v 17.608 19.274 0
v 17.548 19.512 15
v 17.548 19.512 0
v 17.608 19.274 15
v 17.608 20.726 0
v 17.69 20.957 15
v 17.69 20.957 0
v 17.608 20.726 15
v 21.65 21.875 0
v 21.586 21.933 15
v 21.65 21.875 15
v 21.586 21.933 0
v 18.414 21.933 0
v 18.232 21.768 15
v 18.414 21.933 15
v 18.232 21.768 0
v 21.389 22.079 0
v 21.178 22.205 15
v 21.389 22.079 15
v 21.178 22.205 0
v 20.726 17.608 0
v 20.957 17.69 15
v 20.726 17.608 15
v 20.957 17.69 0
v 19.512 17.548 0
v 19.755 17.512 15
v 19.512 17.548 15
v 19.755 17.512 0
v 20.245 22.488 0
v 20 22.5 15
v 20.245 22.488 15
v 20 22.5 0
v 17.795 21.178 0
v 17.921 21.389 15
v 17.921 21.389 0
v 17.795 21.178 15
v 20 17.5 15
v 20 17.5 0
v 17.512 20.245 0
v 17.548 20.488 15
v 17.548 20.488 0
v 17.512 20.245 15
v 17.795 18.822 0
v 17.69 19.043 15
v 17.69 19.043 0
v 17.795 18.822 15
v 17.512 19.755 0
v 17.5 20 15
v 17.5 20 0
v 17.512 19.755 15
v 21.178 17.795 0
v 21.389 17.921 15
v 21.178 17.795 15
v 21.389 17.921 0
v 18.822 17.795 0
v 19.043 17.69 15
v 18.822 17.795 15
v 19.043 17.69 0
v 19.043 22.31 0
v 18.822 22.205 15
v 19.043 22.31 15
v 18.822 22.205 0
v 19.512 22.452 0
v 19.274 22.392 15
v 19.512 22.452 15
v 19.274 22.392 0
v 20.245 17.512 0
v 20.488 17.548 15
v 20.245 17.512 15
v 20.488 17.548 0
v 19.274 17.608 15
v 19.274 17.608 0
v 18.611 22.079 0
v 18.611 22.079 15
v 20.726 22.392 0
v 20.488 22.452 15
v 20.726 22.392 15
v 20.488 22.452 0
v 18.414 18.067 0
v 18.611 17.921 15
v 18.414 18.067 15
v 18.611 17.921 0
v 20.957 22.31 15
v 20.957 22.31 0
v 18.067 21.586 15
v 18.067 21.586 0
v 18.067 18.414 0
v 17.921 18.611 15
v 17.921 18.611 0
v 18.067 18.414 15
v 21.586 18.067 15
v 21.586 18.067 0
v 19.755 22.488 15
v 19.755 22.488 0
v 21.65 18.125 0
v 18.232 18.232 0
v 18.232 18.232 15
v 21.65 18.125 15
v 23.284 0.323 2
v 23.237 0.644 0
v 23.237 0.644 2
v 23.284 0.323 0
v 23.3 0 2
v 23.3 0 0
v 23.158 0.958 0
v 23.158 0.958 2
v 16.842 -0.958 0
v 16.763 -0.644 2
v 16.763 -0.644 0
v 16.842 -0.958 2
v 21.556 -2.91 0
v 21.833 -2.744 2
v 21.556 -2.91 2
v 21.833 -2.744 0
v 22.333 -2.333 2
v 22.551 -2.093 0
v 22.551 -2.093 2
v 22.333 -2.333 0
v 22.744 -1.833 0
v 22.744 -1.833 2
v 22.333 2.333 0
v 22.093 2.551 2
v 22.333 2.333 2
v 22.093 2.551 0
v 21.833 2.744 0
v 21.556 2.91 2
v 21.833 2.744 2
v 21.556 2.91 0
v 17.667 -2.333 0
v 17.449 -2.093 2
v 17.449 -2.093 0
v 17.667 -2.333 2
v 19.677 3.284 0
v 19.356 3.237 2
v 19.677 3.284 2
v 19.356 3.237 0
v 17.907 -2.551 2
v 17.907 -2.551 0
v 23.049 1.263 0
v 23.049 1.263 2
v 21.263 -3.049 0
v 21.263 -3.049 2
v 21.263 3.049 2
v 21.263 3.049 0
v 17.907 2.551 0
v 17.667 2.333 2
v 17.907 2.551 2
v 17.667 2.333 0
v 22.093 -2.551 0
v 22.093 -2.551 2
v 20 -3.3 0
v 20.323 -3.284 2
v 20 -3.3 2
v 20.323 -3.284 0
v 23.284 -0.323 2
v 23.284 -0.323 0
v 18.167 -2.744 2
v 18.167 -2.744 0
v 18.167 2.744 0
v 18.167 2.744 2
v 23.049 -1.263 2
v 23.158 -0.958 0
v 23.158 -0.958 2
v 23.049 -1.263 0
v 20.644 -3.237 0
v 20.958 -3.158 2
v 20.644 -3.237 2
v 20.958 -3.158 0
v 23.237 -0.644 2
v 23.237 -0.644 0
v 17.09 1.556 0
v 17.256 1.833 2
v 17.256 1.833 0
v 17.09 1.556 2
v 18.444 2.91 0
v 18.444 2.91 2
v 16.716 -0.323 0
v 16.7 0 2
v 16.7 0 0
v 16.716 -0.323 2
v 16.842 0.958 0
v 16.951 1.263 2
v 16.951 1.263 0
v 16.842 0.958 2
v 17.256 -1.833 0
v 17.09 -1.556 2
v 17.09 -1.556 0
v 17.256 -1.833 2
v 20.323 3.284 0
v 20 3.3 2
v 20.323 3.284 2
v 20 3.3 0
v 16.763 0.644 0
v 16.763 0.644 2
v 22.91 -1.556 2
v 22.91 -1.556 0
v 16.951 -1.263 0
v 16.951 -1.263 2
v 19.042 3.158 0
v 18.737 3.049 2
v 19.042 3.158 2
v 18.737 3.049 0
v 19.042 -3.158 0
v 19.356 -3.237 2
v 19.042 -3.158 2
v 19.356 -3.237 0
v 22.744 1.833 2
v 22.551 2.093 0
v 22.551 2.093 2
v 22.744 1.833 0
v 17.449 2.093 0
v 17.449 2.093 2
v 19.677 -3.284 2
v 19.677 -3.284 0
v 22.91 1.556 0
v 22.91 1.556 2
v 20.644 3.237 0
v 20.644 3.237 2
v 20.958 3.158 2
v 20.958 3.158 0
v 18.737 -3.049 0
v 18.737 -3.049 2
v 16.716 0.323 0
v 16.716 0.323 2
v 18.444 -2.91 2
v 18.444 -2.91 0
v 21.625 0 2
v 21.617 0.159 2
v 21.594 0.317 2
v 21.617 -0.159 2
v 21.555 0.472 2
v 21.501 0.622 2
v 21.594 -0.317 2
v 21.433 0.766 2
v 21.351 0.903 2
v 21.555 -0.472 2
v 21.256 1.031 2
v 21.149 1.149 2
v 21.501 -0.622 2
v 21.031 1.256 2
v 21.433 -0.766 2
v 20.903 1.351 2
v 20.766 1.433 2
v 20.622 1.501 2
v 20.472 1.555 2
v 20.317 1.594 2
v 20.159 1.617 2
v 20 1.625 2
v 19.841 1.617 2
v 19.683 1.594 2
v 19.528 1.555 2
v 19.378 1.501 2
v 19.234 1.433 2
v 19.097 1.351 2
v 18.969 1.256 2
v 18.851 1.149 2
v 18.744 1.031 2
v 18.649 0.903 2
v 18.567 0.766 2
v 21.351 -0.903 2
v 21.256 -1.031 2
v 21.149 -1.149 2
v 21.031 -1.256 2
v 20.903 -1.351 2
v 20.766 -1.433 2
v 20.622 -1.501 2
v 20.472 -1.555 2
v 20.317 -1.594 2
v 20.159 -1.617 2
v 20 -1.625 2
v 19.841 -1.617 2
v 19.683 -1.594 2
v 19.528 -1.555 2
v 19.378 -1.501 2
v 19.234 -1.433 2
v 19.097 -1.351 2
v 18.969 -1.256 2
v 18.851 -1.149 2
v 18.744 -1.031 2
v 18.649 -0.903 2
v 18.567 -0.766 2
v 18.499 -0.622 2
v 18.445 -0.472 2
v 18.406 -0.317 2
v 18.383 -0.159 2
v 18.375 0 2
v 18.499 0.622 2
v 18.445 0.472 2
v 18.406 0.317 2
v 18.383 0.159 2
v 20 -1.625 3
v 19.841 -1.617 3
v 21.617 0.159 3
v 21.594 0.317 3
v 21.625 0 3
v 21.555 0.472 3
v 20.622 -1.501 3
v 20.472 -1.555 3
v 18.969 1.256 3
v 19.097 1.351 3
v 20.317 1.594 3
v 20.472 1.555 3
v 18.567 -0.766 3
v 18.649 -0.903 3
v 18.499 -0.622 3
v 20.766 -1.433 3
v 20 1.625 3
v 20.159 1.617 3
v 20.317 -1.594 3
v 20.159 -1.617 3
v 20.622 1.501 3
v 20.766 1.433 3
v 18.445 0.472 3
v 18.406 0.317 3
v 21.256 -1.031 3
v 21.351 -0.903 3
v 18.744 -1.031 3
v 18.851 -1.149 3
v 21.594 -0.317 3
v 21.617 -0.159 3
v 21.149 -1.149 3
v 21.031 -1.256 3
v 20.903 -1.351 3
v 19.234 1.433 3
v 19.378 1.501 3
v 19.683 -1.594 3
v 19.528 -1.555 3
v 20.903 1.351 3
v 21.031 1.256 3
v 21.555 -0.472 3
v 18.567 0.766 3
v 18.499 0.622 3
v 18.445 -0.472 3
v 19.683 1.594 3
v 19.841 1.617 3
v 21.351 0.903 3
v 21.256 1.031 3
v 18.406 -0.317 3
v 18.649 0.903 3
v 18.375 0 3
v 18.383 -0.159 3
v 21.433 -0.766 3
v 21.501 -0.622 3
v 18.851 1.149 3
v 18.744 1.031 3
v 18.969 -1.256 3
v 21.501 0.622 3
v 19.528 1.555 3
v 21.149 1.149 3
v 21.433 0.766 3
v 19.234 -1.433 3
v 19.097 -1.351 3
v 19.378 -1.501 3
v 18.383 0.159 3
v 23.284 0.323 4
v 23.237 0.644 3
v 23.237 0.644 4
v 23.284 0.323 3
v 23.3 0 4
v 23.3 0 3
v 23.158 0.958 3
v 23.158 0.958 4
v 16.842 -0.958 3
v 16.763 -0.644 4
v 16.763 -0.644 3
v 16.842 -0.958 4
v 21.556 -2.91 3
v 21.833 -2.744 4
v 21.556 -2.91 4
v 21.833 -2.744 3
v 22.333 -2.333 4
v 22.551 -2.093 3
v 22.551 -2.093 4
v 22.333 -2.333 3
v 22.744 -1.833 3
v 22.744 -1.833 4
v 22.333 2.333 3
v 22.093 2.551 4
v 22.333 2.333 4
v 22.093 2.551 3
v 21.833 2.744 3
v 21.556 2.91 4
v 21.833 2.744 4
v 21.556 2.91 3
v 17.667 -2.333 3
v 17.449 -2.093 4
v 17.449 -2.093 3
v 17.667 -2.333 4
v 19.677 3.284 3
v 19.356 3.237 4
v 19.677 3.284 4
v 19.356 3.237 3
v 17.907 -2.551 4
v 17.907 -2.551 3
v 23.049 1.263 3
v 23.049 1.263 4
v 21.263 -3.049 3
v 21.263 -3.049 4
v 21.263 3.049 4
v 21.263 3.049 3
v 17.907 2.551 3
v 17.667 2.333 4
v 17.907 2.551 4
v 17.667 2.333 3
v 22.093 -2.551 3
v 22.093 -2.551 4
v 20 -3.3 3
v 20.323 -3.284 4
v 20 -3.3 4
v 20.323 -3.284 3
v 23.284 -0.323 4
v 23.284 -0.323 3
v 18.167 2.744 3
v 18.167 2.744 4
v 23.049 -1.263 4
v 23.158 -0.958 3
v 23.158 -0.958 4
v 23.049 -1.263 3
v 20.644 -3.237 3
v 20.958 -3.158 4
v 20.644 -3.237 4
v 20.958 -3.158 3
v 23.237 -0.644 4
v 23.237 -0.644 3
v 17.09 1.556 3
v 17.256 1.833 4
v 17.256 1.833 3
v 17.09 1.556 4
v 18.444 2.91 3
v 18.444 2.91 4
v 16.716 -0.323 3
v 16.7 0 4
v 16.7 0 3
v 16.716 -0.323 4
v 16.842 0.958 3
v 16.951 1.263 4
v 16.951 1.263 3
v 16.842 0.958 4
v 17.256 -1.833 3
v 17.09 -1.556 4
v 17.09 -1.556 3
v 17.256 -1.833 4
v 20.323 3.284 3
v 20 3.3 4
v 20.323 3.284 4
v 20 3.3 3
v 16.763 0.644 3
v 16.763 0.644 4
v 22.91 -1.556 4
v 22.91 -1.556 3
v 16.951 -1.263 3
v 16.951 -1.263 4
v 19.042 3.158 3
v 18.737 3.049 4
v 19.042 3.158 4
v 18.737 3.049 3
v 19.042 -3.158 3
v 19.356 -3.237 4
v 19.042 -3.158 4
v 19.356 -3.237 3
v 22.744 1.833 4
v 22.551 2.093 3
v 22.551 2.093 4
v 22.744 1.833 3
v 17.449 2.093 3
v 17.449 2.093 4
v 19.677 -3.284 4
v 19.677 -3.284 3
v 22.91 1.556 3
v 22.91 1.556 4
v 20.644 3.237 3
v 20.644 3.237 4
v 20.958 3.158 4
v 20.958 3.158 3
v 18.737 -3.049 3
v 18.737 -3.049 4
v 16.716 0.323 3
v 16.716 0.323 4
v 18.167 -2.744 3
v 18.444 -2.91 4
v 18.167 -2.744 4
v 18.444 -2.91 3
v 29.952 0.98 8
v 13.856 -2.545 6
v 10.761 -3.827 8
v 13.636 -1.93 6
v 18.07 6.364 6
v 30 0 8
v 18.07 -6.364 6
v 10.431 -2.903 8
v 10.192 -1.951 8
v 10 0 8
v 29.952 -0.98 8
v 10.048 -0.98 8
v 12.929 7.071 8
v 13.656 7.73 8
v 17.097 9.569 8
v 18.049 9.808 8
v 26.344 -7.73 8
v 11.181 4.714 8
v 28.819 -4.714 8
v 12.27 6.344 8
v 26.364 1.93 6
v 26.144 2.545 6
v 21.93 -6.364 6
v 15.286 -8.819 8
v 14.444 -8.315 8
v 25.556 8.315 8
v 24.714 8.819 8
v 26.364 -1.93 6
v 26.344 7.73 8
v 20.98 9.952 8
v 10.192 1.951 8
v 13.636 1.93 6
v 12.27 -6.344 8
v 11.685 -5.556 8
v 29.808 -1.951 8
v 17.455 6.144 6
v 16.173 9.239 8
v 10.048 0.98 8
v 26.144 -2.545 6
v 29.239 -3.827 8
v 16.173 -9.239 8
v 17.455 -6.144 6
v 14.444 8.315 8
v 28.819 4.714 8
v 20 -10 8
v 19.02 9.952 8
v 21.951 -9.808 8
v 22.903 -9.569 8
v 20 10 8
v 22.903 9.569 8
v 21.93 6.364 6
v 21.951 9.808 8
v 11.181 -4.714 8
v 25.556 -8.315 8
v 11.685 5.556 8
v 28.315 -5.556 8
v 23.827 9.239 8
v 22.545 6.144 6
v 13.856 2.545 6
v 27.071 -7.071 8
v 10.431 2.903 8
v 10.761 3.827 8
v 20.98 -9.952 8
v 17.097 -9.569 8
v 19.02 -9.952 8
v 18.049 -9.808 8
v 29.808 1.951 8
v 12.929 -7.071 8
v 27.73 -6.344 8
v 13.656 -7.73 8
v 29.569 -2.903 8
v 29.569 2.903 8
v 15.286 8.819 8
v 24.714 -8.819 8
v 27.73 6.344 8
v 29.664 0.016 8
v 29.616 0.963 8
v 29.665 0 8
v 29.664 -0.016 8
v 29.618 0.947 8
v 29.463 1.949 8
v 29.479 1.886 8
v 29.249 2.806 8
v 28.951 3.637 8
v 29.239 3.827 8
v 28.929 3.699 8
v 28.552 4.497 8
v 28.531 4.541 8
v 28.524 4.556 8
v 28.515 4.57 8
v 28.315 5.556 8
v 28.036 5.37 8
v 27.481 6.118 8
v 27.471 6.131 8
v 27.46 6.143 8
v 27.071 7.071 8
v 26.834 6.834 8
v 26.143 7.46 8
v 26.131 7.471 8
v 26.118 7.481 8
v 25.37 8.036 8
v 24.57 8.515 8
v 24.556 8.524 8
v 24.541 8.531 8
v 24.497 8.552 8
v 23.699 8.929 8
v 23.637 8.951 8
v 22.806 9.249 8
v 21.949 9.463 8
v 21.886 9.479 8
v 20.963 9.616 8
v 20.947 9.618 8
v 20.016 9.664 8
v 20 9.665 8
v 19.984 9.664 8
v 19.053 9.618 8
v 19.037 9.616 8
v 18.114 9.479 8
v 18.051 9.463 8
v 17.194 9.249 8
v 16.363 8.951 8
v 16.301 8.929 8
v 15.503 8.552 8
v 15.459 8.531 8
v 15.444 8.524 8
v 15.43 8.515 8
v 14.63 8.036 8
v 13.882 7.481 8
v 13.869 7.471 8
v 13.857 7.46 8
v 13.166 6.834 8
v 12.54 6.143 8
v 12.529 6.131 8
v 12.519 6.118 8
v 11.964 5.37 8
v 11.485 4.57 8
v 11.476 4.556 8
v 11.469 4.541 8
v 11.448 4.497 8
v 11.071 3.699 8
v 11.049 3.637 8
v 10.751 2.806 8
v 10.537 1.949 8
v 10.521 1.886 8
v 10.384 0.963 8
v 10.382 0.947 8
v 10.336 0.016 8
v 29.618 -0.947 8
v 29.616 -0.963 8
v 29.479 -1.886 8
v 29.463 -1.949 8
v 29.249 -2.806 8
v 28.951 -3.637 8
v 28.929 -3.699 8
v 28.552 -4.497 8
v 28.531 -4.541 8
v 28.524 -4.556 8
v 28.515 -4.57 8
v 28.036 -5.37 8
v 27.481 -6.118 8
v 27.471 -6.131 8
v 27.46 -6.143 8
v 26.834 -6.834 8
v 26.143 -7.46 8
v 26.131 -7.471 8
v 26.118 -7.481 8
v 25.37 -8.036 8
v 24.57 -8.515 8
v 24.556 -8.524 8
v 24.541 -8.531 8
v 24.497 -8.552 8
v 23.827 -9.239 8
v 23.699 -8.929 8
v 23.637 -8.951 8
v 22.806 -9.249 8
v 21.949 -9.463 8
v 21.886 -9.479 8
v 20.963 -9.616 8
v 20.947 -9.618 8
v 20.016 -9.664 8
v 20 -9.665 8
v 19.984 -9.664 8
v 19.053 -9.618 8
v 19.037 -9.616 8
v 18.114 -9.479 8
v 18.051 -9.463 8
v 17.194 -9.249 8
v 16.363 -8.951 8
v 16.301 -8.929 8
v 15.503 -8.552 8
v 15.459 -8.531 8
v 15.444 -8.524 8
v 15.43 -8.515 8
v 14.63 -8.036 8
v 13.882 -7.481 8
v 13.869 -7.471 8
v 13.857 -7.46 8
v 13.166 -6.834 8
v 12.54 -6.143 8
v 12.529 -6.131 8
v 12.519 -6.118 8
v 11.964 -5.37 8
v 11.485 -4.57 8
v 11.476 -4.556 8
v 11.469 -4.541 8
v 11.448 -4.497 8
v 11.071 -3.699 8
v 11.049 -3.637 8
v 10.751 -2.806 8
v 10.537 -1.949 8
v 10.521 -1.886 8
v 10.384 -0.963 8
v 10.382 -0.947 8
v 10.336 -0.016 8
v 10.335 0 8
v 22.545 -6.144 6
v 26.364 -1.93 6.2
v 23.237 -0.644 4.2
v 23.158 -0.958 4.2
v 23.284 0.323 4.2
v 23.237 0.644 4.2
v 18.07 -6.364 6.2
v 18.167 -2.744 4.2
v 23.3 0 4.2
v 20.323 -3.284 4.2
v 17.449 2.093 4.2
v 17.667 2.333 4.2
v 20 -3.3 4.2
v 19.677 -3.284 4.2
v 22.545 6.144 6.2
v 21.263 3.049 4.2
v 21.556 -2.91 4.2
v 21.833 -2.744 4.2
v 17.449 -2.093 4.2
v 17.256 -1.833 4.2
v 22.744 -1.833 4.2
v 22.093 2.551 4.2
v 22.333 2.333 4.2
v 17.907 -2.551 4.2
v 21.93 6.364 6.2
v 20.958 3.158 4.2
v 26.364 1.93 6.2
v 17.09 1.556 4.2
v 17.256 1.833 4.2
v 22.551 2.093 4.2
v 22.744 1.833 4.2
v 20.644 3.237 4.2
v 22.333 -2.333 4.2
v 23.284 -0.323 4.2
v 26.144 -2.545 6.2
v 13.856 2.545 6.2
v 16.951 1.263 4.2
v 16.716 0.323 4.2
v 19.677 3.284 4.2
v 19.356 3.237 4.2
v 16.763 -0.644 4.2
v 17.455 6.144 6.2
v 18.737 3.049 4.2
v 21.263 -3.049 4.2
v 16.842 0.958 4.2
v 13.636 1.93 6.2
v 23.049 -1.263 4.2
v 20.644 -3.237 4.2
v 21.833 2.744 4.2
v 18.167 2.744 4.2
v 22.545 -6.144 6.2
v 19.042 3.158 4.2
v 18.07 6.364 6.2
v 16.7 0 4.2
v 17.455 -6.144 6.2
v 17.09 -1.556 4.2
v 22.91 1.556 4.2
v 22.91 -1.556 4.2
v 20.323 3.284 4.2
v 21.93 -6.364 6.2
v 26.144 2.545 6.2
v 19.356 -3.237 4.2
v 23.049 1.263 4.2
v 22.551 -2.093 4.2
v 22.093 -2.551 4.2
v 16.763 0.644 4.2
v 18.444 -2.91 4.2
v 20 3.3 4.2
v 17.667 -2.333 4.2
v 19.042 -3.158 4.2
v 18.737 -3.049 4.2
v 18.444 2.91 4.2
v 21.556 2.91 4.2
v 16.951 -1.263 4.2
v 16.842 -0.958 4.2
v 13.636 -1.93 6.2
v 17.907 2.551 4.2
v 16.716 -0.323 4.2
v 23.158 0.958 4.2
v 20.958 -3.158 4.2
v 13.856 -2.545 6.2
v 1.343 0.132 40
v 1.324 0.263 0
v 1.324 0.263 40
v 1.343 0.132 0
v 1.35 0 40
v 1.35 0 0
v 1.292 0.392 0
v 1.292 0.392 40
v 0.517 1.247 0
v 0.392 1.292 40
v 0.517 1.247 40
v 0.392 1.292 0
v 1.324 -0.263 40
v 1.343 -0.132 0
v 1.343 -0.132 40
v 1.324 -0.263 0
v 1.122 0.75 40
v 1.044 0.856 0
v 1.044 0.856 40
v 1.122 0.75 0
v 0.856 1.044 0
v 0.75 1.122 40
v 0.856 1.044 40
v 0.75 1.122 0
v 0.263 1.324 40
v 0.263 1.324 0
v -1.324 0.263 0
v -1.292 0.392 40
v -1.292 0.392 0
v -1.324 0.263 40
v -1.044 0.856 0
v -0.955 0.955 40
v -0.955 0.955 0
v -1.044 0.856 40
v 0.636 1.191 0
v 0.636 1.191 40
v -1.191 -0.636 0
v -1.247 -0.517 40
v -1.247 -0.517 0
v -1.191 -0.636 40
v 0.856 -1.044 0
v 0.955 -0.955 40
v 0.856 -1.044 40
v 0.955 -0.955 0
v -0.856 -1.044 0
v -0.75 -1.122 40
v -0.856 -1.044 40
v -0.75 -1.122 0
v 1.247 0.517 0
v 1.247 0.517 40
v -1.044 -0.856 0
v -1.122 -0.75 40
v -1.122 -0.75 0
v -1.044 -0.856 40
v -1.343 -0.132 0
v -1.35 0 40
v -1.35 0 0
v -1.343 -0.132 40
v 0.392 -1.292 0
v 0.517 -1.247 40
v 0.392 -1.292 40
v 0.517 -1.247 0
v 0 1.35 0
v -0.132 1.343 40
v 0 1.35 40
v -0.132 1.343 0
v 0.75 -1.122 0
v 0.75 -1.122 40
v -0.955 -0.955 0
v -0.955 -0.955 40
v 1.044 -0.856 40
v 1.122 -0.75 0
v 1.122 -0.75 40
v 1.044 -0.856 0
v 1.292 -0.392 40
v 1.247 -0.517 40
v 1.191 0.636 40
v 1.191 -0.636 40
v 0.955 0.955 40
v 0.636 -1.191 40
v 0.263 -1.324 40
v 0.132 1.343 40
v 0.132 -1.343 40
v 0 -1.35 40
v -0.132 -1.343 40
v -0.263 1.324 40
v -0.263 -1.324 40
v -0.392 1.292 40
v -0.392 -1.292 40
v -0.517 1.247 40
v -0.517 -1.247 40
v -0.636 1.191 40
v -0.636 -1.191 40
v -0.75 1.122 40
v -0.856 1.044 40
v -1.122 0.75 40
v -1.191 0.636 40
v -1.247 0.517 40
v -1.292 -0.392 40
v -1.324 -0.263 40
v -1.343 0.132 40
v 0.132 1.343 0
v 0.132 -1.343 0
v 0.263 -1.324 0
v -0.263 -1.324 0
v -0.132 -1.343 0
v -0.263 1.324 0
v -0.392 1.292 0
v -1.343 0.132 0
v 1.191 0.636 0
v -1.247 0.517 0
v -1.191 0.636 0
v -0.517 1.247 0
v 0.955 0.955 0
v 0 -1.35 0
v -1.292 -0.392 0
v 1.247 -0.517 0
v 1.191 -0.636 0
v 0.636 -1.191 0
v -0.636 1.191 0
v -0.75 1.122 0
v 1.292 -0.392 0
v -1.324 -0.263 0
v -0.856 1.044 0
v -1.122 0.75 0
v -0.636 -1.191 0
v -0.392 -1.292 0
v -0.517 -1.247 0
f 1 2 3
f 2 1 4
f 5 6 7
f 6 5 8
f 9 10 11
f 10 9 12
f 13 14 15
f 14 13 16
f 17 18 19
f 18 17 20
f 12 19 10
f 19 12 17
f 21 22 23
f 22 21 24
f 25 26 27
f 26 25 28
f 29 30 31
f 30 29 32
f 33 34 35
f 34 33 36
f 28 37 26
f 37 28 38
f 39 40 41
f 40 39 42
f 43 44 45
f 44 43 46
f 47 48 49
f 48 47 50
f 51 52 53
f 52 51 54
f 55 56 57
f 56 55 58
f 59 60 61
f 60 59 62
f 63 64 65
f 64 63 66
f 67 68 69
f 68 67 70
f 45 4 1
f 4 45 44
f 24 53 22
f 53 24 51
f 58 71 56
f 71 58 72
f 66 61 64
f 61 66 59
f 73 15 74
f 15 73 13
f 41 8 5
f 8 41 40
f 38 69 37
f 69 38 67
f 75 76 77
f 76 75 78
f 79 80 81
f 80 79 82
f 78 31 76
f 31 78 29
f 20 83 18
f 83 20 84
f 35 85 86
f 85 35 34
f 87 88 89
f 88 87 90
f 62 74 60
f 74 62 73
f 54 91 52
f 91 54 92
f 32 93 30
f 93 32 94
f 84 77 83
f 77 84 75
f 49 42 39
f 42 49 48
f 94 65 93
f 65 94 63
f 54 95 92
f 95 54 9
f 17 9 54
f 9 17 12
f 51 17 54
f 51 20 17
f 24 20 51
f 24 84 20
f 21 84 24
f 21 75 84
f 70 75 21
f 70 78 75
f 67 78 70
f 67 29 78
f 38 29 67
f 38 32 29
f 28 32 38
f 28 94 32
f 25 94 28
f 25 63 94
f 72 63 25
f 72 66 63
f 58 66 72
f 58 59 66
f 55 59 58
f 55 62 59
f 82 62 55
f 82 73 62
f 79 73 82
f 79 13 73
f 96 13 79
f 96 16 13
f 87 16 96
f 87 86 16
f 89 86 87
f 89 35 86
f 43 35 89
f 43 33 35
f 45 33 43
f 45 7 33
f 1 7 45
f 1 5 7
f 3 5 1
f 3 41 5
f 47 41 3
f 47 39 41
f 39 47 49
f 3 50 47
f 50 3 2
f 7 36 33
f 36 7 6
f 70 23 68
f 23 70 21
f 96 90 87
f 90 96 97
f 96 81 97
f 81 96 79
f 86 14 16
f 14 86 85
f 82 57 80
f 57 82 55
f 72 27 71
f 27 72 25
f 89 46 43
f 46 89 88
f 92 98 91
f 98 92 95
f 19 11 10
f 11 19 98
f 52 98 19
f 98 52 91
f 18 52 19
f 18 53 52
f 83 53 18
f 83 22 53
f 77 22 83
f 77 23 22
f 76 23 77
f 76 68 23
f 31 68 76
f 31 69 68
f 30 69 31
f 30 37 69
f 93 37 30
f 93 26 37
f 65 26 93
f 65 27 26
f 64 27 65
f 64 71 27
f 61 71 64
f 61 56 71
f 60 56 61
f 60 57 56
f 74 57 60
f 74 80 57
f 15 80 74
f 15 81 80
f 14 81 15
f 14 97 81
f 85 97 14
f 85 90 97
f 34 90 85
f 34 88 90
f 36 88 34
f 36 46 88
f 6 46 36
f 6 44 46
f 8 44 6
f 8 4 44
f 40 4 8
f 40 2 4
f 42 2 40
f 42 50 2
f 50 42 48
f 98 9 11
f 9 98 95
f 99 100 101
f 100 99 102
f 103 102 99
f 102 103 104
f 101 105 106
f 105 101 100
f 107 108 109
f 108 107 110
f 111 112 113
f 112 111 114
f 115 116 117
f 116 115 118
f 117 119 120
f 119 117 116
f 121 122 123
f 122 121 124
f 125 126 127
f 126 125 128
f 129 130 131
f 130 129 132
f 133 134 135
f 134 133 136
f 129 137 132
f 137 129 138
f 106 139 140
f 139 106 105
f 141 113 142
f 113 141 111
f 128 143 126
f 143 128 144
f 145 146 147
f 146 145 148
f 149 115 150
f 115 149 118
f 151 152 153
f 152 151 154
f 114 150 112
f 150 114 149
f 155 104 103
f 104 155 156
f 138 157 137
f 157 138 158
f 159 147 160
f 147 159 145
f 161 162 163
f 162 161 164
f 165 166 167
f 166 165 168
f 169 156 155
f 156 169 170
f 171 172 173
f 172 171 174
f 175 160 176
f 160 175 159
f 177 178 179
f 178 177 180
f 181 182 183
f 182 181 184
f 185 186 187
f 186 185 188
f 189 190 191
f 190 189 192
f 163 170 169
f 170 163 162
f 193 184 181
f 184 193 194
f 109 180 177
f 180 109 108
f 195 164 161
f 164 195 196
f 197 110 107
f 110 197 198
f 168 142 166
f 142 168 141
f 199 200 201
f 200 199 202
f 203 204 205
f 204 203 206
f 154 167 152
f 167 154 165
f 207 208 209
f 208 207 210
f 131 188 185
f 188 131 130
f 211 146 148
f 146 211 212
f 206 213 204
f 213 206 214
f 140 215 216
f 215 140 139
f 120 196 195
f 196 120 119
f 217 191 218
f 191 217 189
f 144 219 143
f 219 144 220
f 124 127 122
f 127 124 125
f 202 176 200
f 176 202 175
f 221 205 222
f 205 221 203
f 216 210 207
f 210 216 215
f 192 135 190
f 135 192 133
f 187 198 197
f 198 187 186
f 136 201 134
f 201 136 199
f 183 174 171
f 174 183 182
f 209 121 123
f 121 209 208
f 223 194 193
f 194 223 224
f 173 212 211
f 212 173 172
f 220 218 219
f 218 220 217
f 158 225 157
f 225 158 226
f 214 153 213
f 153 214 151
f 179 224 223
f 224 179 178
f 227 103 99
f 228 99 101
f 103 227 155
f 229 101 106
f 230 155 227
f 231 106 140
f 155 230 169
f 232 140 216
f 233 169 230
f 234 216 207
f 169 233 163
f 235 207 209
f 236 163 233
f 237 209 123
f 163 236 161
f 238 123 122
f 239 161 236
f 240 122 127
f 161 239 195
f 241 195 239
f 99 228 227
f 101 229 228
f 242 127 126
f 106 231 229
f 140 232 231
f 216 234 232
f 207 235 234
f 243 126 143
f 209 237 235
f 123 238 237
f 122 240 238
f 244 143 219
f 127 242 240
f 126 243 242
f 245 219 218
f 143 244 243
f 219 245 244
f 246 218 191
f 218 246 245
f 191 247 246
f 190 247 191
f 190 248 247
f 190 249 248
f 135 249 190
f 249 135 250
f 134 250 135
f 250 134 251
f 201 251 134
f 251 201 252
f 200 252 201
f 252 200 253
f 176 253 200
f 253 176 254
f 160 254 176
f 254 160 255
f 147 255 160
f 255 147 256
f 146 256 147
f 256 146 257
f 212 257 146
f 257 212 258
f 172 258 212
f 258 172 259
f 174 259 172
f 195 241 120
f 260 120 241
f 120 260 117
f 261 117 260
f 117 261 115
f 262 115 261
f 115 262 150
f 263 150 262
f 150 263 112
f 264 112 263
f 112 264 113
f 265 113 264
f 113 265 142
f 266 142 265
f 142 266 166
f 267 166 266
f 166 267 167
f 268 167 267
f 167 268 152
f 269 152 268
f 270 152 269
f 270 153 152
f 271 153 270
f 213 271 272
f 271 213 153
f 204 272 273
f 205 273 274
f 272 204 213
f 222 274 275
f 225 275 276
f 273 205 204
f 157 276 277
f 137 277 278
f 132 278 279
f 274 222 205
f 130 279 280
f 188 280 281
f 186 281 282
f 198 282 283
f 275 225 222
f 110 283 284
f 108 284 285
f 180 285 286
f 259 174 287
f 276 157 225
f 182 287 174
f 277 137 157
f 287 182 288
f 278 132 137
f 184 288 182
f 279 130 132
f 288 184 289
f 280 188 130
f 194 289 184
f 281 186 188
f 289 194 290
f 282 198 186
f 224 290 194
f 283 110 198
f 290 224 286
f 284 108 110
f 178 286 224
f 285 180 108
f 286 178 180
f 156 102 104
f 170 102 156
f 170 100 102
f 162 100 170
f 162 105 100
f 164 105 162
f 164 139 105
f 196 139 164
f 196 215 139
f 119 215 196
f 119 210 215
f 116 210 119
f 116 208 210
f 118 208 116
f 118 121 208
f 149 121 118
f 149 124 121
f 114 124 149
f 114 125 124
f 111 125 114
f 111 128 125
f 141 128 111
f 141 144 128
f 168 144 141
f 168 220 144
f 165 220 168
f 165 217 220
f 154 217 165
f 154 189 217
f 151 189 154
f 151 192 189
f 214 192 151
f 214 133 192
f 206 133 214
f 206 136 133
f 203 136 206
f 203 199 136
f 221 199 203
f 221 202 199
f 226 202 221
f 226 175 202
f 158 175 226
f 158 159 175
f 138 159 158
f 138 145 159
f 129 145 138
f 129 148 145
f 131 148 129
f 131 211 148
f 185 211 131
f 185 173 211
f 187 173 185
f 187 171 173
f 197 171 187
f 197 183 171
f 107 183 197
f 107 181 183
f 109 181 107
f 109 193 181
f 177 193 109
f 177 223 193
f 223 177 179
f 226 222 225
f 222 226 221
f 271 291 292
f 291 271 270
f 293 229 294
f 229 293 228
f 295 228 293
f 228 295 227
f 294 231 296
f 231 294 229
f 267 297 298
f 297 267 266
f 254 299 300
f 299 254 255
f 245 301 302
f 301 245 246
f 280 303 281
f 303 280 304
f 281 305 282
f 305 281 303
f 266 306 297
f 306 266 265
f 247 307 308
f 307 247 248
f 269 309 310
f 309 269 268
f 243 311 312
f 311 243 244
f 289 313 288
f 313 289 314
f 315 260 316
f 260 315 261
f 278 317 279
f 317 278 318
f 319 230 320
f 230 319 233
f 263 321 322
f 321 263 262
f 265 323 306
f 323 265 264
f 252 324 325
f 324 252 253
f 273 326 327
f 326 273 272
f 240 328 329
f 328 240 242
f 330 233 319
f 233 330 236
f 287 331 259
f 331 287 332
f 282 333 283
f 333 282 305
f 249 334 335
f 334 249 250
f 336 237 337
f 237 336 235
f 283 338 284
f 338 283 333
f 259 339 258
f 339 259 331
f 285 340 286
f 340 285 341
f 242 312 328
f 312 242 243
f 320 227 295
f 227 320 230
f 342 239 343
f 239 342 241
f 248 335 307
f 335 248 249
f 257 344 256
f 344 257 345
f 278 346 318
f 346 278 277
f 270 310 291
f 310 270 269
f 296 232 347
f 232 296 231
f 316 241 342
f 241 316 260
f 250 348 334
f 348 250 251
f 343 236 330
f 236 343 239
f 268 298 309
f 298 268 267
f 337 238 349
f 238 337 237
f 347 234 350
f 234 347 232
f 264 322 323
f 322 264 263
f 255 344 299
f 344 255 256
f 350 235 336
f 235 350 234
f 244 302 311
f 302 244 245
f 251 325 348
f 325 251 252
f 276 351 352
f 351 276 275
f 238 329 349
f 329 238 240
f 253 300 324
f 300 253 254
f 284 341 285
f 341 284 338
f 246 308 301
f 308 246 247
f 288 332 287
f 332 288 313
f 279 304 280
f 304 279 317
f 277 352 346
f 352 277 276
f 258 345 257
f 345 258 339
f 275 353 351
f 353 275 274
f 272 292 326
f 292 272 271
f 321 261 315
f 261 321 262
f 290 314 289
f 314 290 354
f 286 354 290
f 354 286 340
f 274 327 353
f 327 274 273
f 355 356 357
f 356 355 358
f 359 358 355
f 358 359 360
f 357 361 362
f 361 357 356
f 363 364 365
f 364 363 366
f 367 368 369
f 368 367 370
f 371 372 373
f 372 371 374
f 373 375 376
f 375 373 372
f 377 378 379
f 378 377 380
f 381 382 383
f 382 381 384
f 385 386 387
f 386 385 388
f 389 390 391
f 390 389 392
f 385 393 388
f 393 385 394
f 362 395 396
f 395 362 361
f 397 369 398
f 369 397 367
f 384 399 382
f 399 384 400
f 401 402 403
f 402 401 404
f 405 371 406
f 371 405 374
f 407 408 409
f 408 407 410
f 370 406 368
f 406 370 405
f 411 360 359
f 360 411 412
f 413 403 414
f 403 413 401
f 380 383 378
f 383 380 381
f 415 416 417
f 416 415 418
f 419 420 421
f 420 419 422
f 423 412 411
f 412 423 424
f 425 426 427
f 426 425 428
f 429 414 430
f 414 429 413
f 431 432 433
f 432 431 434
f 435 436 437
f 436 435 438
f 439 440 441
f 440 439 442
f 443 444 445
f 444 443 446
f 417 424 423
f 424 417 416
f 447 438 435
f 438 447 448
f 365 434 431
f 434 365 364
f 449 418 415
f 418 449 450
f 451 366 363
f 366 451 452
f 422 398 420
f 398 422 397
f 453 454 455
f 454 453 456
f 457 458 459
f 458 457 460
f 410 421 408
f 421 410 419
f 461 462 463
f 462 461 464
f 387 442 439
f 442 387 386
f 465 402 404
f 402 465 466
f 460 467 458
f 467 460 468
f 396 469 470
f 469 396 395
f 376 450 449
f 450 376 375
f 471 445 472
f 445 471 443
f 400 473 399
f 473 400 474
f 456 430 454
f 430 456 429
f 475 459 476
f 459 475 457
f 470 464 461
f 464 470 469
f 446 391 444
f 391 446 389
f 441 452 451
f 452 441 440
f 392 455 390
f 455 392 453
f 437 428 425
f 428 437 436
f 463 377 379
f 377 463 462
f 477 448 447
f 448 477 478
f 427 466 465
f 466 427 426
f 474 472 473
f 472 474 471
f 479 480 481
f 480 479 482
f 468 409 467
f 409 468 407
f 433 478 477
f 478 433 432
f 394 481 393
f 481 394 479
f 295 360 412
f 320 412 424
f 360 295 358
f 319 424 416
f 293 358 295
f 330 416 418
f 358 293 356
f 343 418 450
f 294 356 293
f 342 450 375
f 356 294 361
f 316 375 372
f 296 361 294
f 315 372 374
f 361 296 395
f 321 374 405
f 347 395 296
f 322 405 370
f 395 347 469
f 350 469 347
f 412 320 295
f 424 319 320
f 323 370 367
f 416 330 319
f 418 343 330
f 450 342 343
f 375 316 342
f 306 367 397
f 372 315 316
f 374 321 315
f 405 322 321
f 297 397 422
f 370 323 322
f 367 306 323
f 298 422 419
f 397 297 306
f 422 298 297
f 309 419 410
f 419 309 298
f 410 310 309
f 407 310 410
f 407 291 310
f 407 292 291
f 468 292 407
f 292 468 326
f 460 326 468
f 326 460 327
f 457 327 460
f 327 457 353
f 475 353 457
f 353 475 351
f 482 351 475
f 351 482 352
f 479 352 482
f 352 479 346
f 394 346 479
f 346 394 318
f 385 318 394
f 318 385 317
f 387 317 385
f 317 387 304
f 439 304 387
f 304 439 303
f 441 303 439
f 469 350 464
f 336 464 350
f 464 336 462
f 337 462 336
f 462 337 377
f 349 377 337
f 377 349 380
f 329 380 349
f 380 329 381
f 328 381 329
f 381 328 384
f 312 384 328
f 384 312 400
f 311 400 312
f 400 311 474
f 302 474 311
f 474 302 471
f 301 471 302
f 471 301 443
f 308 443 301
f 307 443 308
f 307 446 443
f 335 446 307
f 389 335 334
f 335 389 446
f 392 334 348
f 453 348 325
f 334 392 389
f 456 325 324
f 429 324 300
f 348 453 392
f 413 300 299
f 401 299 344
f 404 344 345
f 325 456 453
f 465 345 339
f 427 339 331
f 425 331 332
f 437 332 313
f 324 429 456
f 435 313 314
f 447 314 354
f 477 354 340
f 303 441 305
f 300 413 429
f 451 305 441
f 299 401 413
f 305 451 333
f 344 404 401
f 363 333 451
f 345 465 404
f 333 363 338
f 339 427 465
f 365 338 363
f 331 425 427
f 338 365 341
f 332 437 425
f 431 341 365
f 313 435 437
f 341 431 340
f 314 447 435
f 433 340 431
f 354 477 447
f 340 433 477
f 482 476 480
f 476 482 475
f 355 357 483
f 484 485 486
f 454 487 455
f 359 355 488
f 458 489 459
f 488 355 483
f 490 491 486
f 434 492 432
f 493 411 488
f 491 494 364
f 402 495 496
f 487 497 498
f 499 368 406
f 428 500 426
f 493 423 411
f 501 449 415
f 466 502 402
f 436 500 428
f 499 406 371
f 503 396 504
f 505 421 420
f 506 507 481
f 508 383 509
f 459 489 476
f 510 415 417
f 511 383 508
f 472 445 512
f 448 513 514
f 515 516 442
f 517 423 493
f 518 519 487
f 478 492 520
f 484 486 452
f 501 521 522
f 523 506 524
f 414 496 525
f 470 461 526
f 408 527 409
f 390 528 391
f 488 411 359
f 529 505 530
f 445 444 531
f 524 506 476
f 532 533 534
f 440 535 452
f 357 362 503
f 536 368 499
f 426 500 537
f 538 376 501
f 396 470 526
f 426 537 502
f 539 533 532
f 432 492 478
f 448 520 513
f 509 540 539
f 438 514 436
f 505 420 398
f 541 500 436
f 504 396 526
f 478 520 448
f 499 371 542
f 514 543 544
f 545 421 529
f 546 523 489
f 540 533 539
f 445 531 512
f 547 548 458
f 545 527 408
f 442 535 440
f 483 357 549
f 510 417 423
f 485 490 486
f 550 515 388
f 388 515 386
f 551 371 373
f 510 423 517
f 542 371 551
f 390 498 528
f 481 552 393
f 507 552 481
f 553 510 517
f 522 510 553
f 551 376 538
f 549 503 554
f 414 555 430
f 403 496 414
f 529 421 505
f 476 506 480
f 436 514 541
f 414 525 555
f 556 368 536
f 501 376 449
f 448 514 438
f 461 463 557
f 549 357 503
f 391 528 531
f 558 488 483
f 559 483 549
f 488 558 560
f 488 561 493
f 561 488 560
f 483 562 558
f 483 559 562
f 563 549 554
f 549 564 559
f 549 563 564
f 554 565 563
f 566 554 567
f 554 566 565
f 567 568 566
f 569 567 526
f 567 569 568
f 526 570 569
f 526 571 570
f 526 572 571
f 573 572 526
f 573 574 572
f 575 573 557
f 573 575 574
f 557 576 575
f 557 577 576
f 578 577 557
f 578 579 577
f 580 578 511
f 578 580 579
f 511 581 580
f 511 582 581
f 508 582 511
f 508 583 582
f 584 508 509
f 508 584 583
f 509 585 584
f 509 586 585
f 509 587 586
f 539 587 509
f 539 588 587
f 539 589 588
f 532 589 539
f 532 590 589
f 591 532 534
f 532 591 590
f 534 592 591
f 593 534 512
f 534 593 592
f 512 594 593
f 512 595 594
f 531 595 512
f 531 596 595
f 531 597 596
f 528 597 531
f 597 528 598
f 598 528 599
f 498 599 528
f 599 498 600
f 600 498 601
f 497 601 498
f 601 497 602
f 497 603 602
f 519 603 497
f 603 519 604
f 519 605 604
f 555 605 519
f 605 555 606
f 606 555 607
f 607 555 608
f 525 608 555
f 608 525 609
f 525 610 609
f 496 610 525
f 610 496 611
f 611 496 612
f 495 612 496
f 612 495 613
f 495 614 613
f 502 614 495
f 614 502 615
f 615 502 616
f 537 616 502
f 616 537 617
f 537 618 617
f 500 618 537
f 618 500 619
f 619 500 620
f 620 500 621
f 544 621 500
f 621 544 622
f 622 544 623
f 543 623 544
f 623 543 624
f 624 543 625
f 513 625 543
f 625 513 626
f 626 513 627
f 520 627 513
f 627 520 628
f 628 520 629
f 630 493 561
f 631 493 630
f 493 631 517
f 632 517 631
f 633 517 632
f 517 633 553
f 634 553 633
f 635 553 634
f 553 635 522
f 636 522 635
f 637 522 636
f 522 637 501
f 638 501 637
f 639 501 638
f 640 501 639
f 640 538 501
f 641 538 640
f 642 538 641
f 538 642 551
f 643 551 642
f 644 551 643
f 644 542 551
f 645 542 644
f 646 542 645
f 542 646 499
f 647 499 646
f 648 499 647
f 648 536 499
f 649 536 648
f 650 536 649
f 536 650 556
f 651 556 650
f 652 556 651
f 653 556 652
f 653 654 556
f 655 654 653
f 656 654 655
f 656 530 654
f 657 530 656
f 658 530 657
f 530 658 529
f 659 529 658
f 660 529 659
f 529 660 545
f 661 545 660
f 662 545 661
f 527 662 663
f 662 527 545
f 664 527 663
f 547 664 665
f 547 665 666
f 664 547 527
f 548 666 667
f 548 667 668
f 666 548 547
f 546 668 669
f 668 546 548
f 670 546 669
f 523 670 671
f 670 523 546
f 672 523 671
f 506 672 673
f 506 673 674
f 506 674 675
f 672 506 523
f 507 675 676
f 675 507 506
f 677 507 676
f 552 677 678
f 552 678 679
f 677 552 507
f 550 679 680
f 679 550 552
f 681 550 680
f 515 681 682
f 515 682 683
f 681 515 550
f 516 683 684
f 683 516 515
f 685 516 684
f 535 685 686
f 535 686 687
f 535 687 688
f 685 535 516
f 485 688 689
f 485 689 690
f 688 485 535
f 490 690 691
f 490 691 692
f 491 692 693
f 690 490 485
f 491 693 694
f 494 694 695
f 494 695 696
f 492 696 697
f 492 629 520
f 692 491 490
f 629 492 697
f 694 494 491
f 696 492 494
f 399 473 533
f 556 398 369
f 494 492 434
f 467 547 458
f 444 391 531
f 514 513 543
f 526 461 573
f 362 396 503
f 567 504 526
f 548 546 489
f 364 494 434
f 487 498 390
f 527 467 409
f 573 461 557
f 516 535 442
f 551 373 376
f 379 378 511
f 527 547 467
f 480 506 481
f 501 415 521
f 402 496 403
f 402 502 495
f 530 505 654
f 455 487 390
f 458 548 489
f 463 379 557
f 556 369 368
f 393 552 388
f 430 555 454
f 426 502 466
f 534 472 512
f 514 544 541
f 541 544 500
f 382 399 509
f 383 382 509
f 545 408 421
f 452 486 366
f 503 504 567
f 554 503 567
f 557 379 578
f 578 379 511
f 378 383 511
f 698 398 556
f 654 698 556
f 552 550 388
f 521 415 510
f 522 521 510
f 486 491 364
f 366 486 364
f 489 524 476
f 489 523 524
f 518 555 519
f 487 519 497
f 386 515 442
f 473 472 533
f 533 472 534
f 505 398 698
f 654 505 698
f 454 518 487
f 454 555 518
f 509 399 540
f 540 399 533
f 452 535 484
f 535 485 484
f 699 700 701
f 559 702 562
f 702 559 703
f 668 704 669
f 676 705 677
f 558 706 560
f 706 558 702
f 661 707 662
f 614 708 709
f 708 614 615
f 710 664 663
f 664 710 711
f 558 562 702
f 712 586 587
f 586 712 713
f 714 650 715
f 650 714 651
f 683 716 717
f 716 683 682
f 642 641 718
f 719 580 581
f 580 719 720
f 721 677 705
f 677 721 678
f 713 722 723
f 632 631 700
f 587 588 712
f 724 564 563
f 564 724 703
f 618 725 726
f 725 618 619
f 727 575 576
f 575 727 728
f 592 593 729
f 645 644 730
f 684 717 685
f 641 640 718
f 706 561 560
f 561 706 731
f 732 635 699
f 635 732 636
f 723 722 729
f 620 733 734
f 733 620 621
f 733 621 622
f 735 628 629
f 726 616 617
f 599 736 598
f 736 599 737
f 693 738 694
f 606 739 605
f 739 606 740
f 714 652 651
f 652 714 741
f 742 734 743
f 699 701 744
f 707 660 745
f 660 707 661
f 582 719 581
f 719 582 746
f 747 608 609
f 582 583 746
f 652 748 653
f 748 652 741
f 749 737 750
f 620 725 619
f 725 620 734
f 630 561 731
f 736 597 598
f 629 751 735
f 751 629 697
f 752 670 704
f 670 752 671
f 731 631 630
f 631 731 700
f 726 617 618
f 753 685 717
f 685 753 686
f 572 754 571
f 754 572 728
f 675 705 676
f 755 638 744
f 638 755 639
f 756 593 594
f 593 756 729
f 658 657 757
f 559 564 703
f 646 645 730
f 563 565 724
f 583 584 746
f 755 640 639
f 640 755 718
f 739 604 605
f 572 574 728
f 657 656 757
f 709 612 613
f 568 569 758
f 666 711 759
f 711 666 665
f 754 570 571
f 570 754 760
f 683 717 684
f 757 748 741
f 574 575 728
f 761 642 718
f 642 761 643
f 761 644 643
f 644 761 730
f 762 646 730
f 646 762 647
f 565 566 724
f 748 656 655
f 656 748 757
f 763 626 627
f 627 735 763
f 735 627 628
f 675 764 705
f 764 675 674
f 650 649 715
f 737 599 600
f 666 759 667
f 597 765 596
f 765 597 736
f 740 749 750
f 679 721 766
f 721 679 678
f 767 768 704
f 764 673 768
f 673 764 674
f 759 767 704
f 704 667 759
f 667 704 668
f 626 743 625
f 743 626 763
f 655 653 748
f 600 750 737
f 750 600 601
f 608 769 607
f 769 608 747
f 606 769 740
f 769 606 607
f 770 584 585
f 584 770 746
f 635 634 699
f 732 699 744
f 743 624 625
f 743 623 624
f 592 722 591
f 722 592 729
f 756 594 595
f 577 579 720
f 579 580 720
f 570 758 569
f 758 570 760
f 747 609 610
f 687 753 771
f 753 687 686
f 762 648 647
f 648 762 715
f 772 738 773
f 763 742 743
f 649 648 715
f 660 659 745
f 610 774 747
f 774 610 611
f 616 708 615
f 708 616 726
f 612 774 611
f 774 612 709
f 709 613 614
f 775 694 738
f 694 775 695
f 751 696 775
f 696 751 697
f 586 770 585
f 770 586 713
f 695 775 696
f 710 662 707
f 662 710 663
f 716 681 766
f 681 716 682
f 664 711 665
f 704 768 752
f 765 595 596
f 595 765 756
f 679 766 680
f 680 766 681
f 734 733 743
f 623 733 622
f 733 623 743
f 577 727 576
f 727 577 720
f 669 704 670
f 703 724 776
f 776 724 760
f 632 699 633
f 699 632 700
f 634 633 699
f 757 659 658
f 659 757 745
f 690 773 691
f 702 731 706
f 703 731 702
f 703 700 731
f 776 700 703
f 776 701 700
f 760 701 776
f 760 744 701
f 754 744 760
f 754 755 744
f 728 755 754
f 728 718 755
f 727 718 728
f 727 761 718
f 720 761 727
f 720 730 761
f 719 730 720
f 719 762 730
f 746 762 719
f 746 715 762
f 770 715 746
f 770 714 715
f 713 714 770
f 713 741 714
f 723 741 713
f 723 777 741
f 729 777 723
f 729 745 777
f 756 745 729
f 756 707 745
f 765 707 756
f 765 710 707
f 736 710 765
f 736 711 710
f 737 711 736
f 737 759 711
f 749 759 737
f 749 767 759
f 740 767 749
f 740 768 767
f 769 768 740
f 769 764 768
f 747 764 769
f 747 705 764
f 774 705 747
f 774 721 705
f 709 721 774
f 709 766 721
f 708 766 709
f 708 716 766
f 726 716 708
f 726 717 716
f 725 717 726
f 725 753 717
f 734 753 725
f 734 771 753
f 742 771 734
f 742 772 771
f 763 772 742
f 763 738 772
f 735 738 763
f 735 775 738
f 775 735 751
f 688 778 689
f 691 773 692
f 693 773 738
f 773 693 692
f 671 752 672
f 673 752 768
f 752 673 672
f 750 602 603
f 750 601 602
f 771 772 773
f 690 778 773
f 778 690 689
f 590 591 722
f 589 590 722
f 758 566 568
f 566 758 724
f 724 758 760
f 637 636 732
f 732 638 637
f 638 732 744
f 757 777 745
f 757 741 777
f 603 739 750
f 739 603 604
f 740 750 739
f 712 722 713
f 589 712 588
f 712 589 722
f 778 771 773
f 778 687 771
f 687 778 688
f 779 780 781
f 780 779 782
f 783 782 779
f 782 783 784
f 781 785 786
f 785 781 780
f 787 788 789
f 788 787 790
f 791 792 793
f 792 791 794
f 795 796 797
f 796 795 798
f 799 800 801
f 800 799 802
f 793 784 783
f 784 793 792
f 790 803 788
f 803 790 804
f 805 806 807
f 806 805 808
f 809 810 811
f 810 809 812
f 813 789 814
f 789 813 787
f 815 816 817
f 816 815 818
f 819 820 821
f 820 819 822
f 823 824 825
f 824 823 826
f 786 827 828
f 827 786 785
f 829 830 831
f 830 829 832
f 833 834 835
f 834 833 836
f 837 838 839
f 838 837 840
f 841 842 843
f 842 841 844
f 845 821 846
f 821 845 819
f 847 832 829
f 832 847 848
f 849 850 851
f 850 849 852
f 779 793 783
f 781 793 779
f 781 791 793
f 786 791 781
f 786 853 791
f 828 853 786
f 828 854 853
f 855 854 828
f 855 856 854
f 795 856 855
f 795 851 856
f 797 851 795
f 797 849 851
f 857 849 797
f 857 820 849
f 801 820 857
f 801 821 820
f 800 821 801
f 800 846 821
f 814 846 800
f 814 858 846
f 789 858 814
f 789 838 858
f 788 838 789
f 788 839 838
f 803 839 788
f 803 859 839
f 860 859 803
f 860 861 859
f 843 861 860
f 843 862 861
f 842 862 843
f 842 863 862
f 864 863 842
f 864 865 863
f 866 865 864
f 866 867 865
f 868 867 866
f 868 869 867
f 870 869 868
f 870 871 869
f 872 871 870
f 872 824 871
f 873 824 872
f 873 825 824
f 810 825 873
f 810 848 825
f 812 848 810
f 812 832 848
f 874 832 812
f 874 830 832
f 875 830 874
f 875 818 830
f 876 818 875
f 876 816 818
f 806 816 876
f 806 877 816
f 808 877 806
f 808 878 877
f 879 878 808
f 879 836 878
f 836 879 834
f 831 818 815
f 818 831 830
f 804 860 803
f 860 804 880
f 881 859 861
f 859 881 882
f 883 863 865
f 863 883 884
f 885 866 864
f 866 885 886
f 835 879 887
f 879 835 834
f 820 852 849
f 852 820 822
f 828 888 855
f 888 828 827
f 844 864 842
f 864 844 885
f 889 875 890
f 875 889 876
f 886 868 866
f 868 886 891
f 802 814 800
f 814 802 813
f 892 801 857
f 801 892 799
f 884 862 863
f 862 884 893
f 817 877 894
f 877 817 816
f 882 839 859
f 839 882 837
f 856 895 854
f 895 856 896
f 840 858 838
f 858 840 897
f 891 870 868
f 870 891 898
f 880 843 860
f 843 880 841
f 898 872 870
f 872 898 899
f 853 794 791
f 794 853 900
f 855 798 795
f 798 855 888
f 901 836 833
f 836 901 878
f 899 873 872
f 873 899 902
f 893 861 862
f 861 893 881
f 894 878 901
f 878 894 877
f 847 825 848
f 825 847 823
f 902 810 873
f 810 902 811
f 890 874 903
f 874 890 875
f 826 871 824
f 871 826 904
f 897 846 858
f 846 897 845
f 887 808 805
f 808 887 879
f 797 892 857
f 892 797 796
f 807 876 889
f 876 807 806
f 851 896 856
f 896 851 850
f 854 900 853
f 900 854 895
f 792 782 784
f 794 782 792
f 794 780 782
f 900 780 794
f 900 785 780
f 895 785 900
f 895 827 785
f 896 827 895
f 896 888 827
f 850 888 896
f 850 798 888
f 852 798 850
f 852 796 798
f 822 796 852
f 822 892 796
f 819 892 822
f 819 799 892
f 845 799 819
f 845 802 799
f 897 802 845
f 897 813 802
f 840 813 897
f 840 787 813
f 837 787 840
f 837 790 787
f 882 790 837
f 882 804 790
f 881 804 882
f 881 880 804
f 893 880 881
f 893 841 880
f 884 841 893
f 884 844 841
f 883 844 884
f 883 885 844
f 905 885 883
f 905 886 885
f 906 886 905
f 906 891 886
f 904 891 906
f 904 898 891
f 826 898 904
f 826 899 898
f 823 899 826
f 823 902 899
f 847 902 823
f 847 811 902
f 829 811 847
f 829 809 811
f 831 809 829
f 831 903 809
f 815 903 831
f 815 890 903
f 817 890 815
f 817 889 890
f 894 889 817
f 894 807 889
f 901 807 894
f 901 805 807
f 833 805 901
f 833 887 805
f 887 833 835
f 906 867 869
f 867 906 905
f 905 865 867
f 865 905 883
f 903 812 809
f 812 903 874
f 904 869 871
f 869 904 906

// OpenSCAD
//4.15
/*
translate([-2.5,0,0]) {
    cube([4.15,5,$drive_shaft_length]);
}
*/

$fn=64;

/* The shaft of the nema17 motor as best I can guess */
// nema17 shaft
$drive_shaft_length=15;
$drive_shaft_d = 5;
$drive_shaft_flat_offset = 0.66 * ($drive_shaft_d/2);

module nema17_drive_shaft() {
    difference() {
        cylinder(d=$drive_shaft_d, 
                 h=$drive_shaft_length);
        translate([$drive_shaft_flat_offset,-$drive_shaft_d/2,-1]) {
            cube([$drive_shaft_d,
                  $drive_shaft_d,
                  $drive_shaft_length+2]);
        }
    }
}


/* The small suction cup as best I can guess */
$suction_base_d = 6.6;
$suction_scale_f = 20/$suction_base_d;
$suction_neck_d = 3.25;
module suction_cup() {
    union() {
        cylinder(d=$suction_base_d, h=2);
        translate([0,0,2]) {
            cylinder(d=$suction_neck_d, h=1.5);
        }
        translate([0,0,3]) {
            cylinder(d=$suction_base_d, h=1);
        }        
    }
    difference() {
        translate([0,0,4]) {
            linear_extrude(height = 4, 
                           twist = 0, 
                           slices = 2, 
                           scale=[$suction_scale_f, $suction_scale_f]) {
               circle(r=$suction_base_d/2);
            }
        }
        translate([0,0,4.2]) {
            linear_extrude(height = 4, 
                           twist = 0, 
                           slices = 2, 
                           scale=[$suction_scale_f, $suction_scale_f]) {
               circle(r=$suction_base_d/2);
            }
        }
    }    
}

/* 4-40 threaded rod sans threads */
$threaded_rod_d = 2.7;
$threaded_rod_len = 40;
module threaded_rod_four_forty () {
    cylinder(d=$threaded_rod_d, h=$threaded_rod_len);
}


threaded_rod_four_forty();

translate([20,20,0]) {
    nema17_drive_shaft();
}

translate([20,0,0]) {
    suction_cup();
}
